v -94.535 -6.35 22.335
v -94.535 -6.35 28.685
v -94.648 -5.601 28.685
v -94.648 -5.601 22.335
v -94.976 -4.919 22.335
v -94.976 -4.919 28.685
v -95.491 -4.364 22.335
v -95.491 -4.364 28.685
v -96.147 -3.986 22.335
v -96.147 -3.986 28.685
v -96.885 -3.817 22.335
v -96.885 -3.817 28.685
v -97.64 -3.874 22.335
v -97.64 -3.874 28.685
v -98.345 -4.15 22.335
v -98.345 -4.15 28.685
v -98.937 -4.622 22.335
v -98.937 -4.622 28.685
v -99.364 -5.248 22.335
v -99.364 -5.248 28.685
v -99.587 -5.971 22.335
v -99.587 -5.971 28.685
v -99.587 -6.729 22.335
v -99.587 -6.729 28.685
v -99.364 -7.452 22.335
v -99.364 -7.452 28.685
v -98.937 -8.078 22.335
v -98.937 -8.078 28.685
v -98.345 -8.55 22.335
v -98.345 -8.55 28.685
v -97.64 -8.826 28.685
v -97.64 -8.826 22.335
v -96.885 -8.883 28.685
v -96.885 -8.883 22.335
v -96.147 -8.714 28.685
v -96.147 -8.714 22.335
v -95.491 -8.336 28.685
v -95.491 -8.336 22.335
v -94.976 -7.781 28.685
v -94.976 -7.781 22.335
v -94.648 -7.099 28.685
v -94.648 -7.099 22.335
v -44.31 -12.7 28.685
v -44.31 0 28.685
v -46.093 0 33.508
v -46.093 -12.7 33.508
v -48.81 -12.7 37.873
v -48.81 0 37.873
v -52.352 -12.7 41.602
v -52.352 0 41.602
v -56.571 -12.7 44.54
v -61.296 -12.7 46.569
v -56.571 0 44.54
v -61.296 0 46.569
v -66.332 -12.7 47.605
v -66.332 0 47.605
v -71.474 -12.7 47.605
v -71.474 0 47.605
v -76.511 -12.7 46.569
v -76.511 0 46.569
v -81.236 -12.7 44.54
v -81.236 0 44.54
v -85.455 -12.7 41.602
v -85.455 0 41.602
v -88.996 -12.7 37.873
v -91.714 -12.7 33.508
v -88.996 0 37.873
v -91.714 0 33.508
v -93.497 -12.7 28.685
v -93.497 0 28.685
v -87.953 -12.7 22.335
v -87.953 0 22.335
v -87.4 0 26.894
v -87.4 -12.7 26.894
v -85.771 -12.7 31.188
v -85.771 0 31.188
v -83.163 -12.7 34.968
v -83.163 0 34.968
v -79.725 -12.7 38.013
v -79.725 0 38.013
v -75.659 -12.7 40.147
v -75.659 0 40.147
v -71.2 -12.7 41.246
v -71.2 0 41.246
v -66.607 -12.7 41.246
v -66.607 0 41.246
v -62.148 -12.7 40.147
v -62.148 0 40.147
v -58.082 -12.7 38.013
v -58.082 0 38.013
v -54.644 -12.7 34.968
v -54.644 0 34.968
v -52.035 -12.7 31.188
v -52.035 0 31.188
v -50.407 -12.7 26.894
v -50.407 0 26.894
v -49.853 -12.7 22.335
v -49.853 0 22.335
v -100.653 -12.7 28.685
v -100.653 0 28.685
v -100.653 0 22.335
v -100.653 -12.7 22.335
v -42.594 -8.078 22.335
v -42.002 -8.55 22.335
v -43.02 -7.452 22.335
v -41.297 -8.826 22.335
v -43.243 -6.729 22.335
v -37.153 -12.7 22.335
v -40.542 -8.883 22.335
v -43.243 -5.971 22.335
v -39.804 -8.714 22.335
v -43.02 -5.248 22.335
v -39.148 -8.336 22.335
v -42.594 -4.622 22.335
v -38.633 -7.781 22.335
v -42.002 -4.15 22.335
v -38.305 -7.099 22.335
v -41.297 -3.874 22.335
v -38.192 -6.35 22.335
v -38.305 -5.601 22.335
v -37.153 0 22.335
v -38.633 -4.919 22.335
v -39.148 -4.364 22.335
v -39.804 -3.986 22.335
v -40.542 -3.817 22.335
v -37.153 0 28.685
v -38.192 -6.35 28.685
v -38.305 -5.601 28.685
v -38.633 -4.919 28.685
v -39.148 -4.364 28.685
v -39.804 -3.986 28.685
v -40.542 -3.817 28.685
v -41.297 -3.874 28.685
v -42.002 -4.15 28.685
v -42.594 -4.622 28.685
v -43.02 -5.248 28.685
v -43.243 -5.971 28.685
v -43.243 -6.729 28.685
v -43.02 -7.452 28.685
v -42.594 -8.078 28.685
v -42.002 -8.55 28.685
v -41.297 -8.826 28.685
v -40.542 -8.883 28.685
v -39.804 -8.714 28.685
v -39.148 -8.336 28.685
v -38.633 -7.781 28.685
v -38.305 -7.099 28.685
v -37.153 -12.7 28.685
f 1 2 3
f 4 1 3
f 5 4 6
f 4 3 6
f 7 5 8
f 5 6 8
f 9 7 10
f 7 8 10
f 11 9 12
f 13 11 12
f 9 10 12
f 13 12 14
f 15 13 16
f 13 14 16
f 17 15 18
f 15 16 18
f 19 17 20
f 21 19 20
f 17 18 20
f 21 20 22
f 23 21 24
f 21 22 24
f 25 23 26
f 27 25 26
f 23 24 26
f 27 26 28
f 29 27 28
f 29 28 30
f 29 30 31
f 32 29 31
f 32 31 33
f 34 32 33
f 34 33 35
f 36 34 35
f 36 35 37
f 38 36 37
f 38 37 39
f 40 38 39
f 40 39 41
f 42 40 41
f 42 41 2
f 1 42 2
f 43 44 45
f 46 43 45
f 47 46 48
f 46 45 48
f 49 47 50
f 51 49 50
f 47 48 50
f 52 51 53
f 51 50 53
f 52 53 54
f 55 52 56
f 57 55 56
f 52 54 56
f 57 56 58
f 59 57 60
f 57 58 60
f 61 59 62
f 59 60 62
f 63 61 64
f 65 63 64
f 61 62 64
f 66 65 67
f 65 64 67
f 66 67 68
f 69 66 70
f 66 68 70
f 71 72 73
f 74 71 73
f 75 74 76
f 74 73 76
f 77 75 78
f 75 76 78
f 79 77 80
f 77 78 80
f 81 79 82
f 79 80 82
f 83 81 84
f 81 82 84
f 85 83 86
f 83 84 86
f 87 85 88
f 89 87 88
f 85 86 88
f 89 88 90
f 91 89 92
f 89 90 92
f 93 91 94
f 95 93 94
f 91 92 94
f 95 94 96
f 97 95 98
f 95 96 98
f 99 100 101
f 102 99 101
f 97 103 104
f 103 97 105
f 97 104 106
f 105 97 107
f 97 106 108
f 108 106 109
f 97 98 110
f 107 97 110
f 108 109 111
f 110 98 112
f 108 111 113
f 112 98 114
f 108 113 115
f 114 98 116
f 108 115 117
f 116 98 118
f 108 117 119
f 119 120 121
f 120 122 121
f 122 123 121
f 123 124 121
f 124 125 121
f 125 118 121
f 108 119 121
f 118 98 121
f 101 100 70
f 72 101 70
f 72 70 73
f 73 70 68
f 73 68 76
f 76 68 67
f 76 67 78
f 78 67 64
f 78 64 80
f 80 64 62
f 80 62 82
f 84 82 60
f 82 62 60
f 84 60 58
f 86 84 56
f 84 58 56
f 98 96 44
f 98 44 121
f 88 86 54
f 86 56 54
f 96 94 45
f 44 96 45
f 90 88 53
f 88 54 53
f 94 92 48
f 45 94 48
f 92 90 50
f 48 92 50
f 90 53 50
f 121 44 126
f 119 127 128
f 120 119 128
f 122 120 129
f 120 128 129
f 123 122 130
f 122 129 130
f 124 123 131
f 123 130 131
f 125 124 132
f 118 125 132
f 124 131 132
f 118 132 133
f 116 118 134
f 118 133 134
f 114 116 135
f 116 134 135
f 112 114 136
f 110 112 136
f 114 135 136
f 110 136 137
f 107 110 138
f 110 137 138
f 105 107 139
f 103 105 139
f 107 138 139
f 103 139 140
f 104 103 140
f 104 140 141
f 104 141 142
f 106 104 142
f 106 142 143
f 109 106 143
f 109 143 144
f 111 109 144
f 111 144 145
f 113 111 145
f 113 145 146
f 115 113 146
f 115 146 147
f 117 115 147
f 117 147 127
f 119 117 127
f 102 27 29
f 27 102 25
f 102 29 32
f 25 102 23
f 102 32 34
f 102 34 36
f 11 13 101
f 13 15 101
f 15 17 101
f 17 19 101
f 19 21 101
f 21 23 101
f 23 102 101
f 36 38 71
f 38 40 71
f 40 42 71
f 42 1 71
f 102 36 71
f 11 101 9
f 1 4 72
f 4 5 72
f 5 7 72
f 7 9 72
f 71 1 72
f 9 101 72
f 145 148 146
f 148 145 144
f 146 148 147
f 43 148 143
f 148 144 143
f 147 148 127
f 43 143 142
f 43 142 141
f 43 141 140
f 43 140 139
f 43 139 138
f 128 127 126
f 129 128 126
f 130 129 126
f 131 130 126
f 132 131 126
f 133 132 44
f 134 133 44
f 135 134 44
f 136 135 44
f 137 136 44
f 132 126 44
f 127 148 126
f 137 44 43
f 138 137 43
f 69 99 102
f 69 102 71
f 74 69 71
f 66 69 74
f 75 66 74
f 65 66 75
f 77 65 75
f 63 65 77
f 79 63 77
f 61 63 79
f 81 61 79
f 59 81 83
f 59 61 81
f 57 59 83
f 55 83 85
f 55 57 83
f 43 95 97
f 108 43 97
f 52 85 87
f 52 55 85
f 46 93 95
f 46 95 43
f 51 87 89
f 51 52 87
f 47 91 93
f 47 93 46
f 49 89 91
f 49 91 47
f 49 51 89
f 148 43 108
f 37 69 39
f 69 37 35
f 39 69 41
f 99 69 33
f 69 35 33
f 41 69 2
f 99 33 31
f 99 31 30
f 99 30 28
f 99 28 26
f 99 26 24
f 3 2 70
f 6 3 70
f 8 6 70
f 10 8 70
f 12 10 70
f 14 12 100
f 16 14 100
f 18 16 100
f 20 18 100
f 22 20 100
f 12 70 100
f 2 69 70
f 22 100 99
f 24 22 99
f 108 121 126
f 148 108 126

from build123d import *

# Parameters (mm, degrees)
F1_DEPTH = 12.7
F2_R     = 2.54
F3_DEPTH = 25.4
F4_R     = 2.54
F5_DEPTH = 25.4


with BuildPart() as f1:
    # F0 (on Front) → F1 (new body)
    with BuildSketch(Plane.XZ):
        with BuildLine():
            Line((-49.853401, 28.685216), (-49.853401, 22.335216))
            Line((-49.853401, 22.335216), (-43.503401, 22.335216))
            ThreePointArc((-43.503401, 22.335216), (-43.705847, 25.535725), (-44.309957, 28.685216))
            Line((-44.309957, 28.685216), (-49.853401, 28.685216))
        make_face()
        with BuildLine():
            ThreePointArc((-87.953401, 22.335216), (-68.903401, 41.385216), (-49.853401, 22.335216))
            Line((-49.853401, 22.335216), (-49.853401, 28.685216))
            Line((-49.853401, 28.685216), (-44.309957, 28.685216))
            ThreePointArc((-44.309957, 28.685216), (-68.903401, 47.735216), (-93.496846, 28.685216))
            Line((-93.496846, 28.685216), (-87.953401, 28.685216))
            Line((-87.953401, 28.685216), (-87.953401, 22.335216))
        make_face()
        with BuildLine():
            Line((-94.303401, 22.335216), (-87.953401, 22.335216))
            Line((-87.953401, 22.335216), (-87.953401, 28.685216))
            Line((-87.953401, 28.685216), (-93.496846, 28.685216))
            ThreePointArc((-93.496846, 28.685216), (-94.100956, 25.535725), (-94.303401, 22.335216))
        make_face()
        with BuildLine():
            ThreePointArc((-44.309957, 28.685216), (-43.705847, 25.535725), (-43.503401, 22.335216))
            Line((-43.503401, 22.335216), (-37.153401, 22.335216))
            Line((-37.153401, 22.335216), (-37.153401, 28.685216))
            Line((-37.153401, 28.685216), (-44.309957, 28.685216))
        make_face()
        with BuildLine():
            Line((-100.653401, 22.335216), (-94.303401, 22.335216))
            ThreePointArc((-94.303401, 22.335216), (-94.100956, 25.535725), (-93.496846, 28.685216))
            Line((-93.496846, 28.685216), (-100.653401, 28.685216))
            Line((-100.653401, 28.685216), (-100.653401, 22.335216))
        make_face()
    extrude(amount=F1_DEPTH)

    # F2 (on face) → F3 (cut)
    with BuildSketch(Plane.XY.offset(28.685216)):
        with Locations((-40.731679, -6.35)):
            Circle(F2_R)
    extrude(amount=-F3_DEPTH, mode=Mode.SUBTRACT)

    # F4 (on face) → F5 (cut)
    with BuildSketch(Plane.XY.offset(28.685216)):
        with Locations((-97.075124, -6.35)):
            Circle(F4_R)
    extrude(amount=-F5_DEPTH, mode=Mode.SUBTRACT)


solid = f1.part
